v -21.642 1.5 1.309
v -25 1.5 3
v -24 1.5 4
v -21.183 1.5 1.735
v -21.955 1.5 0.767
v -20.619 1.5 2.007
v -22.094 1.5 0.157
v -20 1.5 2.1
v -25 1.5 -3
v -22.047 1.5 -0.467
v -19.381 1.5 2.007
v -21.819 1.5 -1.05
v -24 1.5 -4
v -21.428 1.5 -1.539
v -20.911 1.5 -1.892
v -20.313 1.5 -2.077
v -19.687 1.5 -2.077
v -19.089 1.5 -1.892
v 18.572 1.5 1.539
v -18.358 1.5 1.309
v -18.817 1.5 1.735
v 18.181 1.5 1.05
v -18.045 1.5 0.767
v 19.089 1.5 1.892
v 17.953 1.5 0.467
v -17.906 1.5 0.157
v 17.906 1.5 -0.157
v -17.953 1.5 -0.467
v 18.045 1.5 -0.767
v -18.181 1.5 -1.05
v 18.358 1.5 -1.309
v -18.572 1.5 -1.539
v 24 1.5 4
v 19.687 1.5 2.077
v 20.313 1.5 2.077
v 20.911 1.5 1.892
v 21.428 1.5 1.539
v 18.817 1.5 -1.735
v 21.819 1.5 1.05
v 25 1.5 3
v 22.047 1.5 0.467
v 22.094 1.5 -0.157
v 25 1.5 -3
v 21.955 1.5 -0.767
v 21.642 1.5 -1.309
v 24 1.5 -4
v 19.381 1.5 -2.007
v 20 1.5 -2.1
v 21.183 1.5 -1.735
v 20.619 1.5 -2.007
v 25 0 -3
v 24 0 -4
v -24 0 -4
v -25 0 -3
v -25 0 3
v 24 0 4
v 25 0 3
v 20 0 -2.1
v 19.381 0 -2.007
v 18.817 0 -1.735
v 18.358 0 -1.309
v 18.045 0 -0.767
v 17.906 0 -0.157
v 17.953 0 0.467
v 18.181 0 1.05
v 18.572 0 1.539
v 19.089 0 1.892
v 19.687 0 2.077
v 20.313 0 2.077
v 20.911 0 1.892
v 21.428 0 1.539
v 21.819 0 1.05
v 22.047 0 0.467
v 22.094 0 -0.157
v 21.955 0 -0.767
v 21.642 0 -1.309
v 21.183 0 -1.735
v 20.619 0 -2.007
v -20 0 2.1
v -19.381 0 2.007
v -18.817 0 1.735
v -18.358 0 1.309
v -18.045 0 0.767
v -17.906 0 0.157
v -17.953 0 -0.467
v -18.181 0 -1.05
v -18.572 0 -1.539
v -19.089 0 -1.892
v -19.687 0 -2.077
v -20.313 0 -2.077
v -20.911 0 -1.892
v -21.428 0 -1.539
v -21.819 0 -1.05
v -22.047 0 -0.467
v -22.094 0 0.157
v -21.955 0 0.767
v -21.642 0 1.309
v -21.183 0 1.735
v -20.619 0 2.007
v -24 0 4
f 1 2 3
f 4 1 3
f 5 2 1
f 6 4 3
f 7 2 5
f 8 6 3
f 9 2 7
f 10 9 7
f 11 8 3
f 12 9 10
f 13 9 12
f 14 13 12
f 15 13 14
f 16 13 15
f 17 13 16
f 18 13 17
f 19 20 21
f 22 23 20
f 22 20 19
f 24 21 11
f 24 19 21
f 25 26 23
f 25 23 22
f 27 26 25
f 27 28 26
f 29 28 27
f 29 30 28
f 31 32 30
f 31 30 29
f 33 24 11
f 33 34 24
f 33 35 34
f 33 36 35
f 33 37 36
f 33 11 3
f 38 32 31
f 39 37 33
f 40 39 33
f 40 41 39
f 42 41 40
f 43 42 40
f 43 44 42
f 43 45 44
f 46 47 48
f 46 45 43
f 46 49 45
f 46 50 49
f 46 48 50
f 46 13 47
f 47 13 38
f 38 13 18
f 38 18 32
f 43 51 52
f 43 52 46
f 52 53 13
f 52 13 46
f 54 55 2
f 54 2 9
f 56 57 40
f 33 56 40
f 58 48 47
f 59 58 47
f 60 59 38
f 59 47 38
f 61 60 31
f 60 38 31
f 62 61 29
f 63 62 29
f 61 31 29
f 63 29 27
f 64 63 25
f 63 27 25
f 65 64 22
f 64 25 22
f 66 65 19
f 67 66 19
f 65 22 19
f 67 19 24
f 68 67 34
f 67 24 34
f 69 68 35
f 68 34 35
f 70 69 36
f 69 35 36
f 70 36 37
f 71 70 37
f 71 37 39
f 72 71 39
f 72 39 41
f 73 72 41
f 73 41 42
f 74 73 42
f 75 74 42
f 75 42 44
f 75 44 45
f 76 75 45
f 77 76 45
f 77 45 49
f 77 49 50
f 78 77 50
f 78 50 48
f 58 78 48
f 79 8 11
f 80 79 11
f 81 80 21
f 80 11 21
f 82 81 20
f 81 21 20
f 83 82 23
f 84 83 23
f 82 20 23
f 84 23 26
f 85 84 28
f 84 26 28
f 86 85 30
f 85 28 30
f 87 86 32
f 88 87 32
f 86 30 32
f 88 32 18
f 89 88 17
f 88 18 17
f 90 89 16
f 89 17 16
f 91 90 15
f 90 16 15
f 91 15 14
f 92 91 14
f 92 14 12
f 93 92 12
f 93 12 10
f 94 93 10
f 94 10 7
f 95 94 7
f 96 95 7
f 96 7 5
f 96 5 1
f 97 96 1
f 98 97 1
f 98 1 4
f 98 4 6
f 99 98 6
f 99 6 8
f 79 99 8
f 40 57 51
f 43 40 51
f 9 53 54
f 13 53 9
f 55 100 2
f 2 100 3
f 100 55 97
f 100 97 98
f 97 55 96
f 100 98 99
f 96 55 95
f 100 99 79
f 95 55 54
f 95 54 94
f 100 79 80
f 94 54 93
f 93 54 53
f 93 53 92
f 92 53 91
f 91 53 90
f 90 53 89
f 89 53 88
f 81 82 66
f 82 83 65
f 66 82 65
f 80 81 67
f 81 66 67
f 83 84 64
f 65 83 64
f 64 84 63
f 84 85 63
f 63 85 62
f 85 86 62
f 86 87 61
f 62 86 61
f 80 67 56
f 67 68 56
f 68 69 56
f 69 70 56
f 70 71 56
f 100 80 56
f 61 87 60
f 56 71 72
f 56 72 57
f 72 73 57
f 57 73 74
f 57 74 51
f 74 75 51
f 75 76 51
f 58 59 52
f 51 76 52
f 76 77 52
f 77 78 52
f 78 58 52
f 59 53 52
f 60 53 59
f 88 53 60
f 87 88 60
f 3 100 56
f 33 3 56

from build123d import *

# Parameters (mm, degrees)
SKETCH_1_W          = 50
SKETCH_1_H          = 8
EXTRUDE_1_DEPTH     = 1.5
SKETCH_2_R          = 2.1
CUT_EXTRUDE_1_DEPTH = 26.362373706
CHAMFER_1_SIZE      = 1


with BuildPart() as part:
    # 草图1 → 凸台-拉伸1 (new body)
    with BuildSketch(Plane(origin=(0, 0, 0), x_dir=(1, 0, 0), z_dir=(0, 1, 0))):
        Rectangle(SKETCH_1_W, SKETCH_1_H)
    extrude(amount=EXTRUDE_1_DEPTH)

    # 草图2 → 切除-拉伸1 (cut, through all)
    with BuildSketch(Plane(origin=(0, 1.5, 0), x_dir=(1, 0, 0), z_dir=(0, 1, 0))):
        with Locations(Location((-20, 0, 0), (0, 0, 270))):
            Circle(SKETCH_2_R)
        with Locations(Location((20, 0, 0), (0, 0, 90))):
            Circle(SKETCH_2_R)
    extrude(amount=-CUT_EXTRUDE_1_DEPTH, mode=Mode.SUBTRACT)

    # 倒角1
    chamfer_1_edges = [part.edges().sort_by_distance(p)[0] for p in [
        (25, 0.75, 4),
        (-25, 0.75, 4),
        (-25, 0.75, -4),
        (25, 0.75, -4),
    ]]
    chamfer(chamfer_1_edges, length=CHAMFER_1_SIZE)


solid = part.part
